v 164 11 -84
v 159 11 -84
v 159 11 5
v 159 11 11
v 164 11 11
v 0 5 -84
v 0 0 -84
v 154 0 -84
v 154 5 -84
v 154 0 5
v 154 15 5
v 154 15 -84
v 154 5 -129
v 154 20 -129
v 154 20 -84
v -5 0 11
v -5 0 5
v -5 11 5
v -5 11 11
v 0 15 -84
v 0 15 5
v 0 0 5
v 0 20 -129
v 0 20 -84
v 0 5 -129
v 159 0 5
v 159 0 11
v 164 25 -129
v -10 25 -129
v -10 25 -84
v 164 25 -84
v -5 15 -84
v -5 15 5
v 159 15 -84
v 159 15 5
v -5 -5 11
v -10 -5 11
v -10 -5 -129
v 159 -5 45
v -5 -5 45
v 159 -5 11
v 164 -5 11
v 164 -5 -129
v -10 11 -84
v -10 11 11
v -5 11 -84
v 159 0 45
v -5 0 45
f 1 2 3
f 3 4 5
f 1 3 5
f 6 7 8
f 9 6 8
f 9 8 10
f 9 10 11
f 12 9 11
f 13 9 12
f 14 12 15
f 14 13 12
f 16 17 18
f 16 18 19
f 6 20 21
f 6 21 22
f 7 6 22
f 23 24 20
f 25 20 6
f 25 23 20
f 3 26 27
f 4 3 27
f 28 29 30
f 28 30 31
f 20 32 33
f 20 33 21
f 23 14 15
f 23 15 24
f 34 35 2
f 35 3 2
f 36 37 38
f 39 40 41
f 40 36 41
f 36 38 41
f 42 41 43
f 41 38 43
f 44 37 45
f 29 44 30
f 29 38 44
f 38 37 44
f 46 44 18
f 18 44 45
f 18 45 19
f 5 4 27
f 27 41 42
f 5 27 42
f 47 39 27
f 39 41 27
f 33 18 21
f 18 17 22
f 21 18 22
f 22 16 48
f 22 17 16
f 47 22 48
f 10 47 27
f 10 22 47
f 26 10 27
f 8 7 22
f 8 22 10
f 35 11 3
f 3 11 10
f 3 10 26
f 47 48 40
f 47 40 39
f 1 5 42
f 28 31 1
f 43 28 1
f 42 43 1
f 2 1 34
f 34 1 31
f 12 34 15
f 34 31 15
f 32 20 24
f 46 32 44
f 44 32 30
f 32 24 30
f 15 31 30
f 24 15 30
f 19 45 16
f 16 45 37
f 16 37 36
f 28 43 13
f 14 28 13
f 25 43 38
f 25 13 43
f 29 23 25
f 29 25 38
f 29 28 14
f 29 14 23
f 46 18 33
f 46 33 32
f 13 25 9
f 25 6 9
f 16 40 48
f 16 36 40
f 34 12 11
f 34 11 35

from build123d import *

# Parameters (mm, degrees)
SKETCH1_W           = 164
SKETCH1_H           = 94
BOSS_EXTRUDE1_DEPTH = 5
BOSS_EXTRUDE2_DEPTH = 5
SKETCH2_W           = 164
SKETCH2_H           = 30
BOSS_EXTRUDE3_DEPTH = 5
SKETCH3_W           = 5
SKETCH3_H           = 94
BOSS_EXTRUDE4_DEPTH = 10
SKETCH4_W           = 5
SKETCH4_H           = 100
BOSS_EXTRUDE5_DEPTH = 16
SKETCH5_W           = 5
SKETCH5_H           = 5
CUT_EXTRUDE1_DEPTH  = 4
BOSS_EXTRUDE6_DEPTH = 40
BOSS_EXTRUDE7_DEPTH = 45
SKETCH9_W           = 164
SKETCH9_H           = 5
BOSS_EXTRUDE8_DEPTH = 10


with BuildPart() as part:
    # Sketch1 → Boss-Extrude1 (new body)
    with BuildSketch(Plane(origin=(0, 0, 0), x_dir=(1, 0, 0), z_dir=(0, 1, 0))):
        with Locations((77, 42)):
            Rectangle(SKETCH1_W, SKETCH1_H)
    extrude(amount=-BOSS_EXTRUDE1_DEPTH)

    # Sketch1<3> → Boss-Extrude2 (add)
    with BuildSketch(Plane(origin=(0, 0, 0), x_dir=(1, 0, 0), z_dir=(0, 1, 0))):
        Polygon((0, -5), (0, 0), (0, 84), (154, 84), (154, 0), (154, -5), (159, -5), (159, 89), (-5, 89), (-5, -5), align=None)
    extrude(amount=BOSS_EXTRUDE2_DEPTH)

    # Sketch2 → Boss-Extrude3 (add)
    with BuildSketch(Plane(origin=(0, -5, 0), x_dir=(-1, 0, 0), z_dir=(0, -1, 0))):
        with Locations((-77, -20)):
            Rectangle(SKETCH2_W, SKETCH2_H)
    extrude(amount=-BOSS_EXTRUDE3_DEPTH)

    # Sketch3 → Boss-Extrude4 (add)
    with BuildSketch(Plane(origin=(0, 5, 0), x_dir=(1, 0, 0), z_dir=(0, 1, 0))):
        with Locations((-2.5, 42)):
            Rectangle(SKETCH3_W, SKETCH3_H)
        with Locations((156.5, 42)):
            Rectangle(SKETCH3_W, SKETCH3_H)
    extrude(amount=BOSS_EXTRUDE4_DEPTH)

    # Sketch4 → Boss-Extrude5 (add)
    with BuildSketch(Plane.XZ.offset(5)):
        with Locations((-7.5, -39)):
            Rectangle(SKETCH4_W, SKETCH4_H)
        with Locations((161.5, -39)):
            Rectangle(SKETCH4_W, SKETCH4_H)
    extrude(amount=-BOSS_EXTRUDE5_DEPTH)

    # Sketch5 → Cut-Extrude1 (cut)
    with BuildSketch(Plane(origin=(0, 15, 0), x_dir=(1, 0, 0), z_dir=(0, 1, 0))):
        with Locations((-2.5, 86.5)):
            Rectangle(SKETCH5_W, SKETCH5_H)
        with Locations((156.5, 86.5)):
            Rectangle(SKETCH5_W, SKETCH5_H)
    extrude(amount=-CUT_EXTRUDE1_DEPTH, mode=Mode.SUBTRACT)

    # Sketch6 → Boss-Extrude6 (add)
    with BuildSketch(Plane(origin=(0, 0, -89), x_dir=(-1, 0, 0), z_dir=(0, 0, -1))):
        Polygon((10, -5), (10, 11), (0, 11), (0, 5), (-154, 5), (-154, 11), (-164, 11), (-164, -5), align=None)
    extrude(amount=BOSS_EXTRUDE6_DEPTH)

    # Sketch8 → Boss-Extrude7 (add)
    with BuildSketch(Plane(origin=(0, 0, -129), x_dir=(-1, 0, 0), z_dir=(0, 0, -1))):
        Polygon((-164, 11), (-154, 11), (-154, 20), (0, 20), (0, 11), (10, 11), (10, 25), (-164, 25), align=None)
    extrude(amount=-BOSS_EXTRUDE7_DEPTH)

    # Sketch9 → Boss-Extrude8 (add)
    with BuildSketch(Plane.XY.offset(35)):
        with Locations((77, -2.5)):
            Rectangle(SKETCH9_W, SKETCH9_H)
    extrude(amount=BOSS_EXTRUDE8_DEPTH)


solid = part.part
